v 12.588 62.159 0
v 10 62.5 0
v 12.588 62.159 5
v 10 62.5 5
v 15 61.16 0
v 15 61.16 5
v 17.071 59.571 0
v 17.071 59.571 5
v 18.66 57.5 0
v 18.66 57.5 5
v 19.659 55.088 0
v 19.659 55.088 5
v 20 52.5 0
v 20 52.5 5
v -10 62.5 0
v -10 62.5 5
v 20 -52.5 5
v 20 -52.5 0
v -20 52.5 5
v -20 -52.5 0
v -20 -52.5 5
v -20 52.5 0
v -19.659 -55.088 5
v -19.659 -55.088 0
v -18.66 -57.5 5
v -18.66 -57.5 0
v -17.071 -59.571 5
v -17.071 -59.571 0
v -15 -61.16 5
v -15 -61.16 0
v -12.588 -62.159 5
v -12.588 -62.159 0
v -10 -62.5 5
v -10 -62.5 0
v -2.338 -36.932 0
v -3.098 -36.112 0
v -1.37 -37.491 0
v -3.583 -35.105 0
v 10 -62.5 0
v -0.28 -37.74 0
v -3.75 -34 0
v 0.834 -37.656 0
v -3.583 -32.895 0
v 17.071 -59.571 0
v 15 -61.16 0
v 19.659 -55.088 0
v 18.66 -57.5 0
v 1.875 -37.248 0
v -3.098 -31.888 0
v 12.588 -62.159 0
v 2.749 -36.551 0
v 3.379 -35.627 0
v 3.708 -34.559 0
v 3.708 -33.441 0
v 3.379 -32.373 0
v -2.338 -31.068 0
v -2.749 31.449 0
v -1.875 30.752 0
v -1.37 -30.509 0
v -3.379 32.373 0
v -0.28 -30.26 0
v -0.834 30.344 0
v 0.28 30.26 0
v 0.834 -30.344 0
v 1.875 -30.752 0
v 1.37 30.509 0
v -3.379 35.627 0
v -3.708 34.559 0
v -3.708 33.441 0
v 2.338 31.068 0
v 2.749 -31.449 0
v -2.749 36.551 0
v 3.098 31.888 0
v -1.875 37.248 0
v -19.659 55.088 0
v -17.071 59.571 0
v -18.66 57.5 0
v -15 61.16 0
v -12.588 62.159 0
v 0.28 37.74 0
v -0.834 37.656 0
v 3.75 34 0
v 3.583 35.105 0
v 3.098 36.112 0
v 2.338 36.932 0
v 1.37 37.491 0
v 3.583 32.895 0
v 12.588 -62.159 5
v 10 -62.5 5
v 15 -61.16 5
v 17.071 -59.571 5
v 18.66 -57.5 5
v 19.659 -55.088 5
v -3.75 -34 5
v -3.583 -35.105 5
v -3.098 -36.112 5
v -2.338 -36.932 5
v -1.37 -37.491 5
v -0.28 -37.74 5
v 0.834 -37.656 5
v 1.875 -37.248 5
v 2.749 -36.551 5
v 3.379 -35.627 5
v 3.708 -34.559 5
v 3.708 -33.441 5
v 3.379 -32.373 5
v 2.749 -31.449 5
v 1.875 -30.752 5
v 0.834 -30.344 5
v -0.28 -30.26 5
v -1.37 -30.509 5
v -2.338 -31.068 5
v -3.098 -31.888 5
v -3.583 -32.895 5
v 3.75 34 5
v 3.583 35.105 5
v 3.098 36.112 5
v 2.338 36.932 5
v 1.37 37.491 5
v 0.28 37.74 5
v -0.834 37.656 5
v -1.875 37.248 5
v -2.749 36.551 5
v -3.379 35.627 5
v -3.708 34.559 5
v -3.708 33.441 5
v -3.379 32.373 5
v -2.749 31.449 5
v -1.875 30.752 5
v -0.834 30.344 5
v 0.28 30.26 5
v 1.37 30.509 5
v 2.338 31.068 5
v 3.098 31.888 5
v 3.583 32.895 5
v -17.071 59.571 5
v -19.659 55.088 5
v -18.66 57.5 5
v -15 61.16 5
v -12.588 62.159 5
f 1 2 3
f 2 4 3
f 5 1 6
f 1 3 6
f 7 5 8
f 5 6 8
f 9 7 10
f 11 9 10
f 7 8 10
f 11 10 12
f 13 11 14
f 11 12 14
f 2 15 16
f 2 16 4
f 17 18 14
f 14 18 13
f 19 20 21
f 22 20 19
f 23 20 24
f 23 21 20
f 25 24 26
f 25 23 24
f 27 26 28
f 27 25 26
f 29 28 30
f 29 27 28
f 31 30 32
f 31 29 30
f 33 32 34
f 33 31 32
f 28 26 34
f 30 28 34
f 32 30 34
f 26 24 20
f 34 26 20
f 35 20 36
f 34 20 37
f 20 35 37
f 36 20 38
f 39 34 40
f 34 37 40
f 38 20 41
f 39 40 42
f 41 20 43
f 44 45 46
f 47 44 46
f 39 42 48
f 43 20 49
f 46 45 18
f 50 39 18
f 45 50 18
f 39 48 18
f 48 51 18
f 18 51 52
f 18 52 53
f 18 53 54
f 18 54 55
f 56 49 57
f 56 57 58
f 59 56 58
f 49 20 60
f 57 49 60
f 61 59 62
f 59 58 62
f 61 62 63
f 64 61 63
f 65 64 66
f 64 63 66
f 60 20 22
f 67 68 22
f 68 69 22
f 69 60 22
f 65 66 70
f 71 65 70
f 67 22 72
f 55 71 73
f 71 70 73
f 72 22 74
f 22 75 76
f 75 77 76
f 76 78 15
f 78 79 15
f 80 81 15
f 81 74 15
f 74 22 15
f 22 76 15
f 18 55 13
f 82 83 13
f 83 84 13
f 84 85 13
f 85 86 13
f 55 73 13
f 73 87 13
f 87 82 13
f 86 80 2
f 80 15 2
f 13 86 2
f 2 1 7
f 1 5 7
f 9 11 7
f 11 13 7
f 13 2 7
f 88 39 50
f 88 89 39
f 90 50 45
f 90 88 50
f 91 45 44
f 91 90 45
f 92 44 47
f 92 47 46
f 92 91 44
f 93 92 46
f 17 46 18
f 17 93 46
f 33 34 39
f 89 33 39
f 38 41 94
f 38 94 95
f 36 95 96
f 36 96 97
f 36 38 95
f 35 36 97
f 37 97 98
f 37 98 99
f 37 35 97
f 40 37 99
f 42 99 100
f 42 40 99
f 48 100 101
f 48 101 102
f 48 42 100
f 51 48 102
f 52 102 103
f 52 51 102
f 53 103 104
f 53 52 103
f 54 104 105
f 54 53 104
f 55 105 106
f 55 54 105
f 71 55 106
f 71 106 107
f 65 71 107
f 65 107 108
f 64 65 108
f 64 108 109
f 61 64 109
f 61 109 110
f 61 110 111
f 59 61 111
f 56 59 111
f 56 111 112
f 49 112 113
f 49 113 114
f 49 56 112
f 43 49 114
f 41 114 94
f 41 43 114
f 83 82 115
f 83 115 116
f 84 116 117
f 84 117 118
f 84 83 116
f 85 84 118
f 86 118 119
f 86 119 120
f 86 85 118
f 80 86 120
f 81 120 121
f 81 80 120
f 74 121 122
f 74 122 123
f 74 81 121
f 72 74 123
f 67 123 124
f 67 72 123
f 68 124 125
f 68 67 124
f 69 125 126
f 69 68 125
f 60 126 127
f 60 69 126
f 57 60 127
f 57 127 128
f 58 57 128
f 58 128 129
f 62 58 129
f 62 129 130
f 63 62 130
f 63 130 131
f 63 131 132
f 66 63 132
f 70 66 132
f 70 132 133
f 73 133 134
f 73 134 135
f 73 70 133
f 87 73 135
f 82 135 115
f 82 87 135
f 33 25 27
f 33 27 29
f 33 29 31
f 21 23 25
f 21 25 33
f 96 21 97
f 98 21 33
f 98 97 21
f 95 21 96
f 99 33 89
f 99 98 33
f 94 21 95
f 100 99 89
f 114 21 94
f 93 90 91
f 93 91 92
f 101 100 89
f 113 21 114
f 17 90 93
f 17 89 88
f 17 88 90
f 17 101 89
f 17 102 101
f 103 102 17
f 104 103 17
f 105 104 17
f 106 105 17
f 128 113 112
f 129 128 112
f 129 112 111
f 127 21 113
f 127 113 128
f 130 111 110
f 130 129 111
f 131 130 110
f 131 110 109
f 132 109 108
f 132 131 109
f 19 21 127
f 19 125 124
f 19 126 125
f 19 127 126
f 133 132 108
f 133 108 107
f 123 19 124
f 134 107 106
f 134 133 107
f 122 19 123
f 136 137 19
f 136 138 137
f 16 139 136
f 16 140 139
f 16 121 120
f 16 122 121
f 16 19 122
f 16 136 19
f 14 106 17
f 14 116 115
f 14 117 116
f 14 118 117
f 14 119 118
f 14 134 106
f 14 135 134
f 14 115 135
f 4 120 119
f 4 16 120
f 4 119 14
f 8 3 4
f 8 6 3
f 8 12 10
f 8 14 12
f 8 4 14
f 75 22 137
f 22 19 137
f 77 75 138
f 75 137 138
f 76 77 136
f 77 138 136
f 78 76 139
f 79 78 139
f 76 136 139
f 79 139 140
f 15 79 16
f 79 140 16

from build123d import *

# Parameters (mm, degrees)
SKIZZE1_W                       = 40
SKIZZE1_H                       = 125
SKIZZE1_R                       = 3.75
AUFSATZ_LINEAR_AUSTRAGEN1_DEPTH = 5
VERRUNDUNG1_R                   = 10


with BuildPart() as part:
    # Skizze1 → Aufsatz-Linear austragen1 (new body)
    with BuildSketch(Plane.XY):
        Rectangle(SKIZZE1_W, SKIZZE1_H)
        with Locations((0, 34)):
            Circle(SKIZZE1_R, mode=Mode.SUBTRACT)
        with Locations(Location((0, -34, 0), (0, 0, 180))):
            Circle(SKIZZE1_R, mode=Mode.SUBTRACT)
    extrude(amount=AUFSATZ_LINEAR_AUSTRAGEN1_DEPTH)

    # Verrundung1
    verrundung1_edges = [part.edges().sort_by_distance(p)[0] for p in [
        (-20, 62.5, 2.5),
        (20, 62.5, 2.5),
        (20, -62.5, 2.5),
        (-20, -62.5, 2.5),
    ]]
    fillet(verrundung1_edges, radius=VERRUNDUNG1_R)


solid = part.part
